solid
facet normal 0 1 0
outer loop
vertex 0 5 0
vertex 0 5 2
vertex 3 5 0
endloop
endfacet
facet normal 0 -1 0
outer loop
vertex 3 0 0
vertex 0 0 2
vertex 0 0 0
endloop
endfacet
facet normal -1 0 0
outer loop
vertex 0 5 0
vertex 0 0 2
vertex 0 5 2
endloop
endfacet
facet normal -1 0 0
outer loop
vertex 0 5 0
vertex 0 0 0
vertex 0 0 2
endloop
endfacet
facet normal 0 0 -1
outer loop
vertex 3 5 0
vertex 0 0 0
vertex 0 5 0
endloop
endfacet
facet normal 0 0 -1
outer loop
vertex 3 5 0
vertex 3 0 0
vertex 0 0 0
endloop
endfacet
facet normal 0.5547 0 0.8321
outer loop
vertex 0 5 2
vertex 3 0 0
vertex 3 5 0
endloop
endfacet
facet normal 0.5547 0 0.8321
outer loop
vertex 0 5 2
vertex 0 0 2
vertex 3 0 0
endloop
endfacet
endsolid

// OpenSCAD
//Draw a triangular prism based on a
//right angled triangle
//l - length of prism
//w - width of triangle
//h - height of triangle
module prism(l, w, h) {
	translate([0, l, 0]) rotate( a= [90, 0, 0])
	linear_extrude(height = l) polygon(points = [
		[0, 0],
		[w, 0],
		[0, h]
	], paths=[[0,1,2,0]]);
}

prism(5, 3, 2);
